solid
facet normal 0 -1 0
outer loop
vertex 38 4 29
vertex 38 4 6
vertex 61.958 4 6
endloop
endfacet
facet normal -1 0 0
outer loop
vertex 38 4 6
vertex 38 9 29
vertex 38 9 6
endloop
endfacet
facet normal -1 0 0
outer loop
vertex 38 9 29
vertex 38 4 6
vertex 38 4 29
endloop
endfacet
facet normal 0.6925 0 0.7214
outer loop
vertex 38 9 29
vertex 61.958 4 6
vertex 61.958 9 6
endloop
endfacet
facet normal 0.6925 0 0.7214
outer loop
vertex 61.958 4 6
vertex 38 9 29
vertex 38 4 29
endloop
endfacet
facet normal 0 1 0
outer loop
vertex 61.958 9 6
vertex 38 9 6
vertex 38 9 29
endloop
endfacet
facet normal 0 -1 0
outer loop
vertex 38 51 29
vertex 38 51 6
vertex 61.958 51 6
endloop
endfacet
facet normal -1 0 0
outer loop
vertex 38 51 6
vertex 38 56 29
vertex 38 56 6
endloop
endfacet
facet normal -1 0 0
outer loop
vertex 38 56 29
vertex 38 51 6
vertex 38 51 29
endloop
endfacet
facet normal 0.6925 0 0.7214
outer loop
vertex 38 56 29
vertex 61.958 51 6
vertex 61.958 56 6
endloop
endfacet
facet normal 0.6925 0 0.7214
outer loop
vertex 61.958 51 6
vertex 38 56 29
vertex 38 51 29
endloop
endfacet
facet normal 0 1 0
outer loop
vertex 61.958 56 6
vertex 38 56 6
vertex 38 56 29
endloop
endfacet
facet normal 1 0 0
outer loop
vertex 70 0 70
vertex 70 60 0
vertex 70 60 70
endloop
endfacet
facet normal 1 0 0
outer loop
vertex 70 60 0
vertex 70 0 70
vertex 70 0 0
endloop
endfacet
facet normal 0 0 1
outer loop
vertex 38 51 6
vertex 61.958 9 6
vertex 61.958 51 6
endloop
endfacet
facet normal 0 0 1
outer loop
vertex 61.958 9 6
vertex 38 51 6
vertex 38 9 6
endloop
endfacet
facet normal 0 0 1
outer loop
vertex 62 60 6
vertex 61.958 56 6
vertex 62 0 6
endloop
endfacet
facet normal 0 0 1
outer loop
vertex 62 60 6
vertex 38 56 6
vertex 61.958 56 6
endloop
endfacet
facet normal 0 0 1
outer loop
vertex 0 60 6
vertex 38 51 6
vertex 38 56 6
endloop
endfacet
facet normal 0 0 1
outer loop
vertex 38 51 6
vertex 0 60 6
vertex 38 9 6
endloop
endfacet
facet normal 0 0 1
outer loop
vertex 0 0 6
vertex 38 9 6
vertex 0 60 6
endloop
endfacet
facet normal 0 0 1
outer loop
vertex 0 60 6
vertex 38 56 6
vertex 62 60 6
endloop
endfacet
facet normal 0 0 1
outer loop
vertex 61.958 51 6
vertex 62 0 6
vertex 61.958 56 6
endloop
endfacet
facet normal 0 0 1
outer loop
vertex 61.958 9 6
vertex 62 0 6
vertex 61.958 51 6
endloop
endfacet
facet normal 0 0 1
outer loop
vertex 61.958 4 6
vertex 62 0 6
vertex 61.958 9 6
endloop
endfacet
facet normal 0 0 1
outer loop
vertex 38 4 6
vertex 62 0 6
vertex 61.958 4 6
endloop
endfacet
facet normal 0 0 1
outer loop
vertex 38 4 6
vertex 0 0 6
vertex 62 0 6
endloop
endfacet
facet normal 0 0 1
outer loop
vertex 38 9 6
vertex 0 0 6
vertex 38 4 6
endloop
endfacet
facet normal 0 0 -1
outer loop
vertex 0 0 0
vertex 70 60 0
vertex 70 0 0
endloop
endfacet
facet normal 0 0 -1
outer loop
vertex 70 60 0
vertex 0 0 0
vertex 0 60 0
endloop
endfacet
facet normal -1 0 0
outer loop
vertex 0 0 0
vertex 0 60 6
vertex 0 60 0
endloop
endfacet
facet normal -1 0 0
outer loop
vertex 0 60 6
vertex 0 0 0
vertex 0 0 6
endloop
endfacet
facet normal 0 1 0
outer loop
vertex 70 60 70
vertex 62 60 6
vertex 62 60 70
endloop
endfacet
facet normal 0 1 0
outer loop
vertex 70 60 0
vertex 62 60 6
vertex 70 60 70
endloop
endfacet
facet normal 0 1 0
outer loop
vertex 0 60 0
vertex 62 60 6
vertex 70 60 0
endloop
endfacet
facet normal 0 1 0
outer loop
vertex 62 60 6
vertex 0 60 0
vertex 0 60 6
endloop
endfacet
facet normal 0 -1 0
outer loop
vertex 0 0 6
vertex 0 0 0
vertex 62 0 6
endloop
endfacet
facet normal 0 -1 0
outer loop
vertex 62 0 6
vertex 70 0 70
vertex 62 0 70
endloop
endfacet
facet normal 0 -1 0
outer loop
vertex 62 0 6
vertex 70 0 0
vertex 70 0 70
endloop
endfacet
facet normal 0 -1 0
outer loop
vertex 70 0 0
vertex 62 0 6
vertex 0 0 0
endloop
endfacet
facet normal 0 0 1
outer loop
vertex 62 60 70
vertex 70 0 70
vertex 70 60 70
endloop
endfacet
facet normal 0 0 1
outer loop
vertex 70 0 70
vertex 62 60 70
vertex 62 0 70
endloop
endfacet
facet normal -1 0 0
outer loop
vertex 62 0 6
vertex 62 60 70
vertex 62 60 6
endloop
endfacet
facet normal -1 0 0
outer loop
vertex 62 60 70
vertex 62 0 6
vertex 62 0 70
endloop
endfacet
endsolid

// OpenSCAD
$fn = 32;

// ----------------------------------------------------------------------
// Rib bracket: 2-gusset L bracket
// ----------------------------------------------------------------------

// --- parameters (mm) ---
base_l = 70;              // foot length, X
base_w = 60;              // foot width, Y
base_t = 6;               // foot thickness
plate_t = 8;              // upright plate thickness
plate_h = 70;             // overall height
gus_l = 24;               // gusset leg along the foot
gus_h = 24;               // gusset height
gus_t = 5;                // gusset thickness
gus_edge = 4;             // gusset margin from the foot edge
n_gus = 2;                // gusset count

gus_pitch = (base_w - 2 * gus_edge - gus_t) / (n_gus - 1);  // gusset pitch

union() {
  cube([base_l, base_w, base_t]);
  translate([base_l - plate_t, 0, base_t - 1])
    cube([plate_t, base_w, plate_h - base_t + 1]);
  for (i = [0 : n_gus - 1])
    translate([base_l - plate_t - gus_l, gus_edge + i * gus_pitch, base_t - 1])
      rotate([-90, 0, 0])
        linear_extrude(height = gus_t)
          polygon(points = [[0, 0], [gus_l + 1, 0], [0, -gus_h]]);
}
